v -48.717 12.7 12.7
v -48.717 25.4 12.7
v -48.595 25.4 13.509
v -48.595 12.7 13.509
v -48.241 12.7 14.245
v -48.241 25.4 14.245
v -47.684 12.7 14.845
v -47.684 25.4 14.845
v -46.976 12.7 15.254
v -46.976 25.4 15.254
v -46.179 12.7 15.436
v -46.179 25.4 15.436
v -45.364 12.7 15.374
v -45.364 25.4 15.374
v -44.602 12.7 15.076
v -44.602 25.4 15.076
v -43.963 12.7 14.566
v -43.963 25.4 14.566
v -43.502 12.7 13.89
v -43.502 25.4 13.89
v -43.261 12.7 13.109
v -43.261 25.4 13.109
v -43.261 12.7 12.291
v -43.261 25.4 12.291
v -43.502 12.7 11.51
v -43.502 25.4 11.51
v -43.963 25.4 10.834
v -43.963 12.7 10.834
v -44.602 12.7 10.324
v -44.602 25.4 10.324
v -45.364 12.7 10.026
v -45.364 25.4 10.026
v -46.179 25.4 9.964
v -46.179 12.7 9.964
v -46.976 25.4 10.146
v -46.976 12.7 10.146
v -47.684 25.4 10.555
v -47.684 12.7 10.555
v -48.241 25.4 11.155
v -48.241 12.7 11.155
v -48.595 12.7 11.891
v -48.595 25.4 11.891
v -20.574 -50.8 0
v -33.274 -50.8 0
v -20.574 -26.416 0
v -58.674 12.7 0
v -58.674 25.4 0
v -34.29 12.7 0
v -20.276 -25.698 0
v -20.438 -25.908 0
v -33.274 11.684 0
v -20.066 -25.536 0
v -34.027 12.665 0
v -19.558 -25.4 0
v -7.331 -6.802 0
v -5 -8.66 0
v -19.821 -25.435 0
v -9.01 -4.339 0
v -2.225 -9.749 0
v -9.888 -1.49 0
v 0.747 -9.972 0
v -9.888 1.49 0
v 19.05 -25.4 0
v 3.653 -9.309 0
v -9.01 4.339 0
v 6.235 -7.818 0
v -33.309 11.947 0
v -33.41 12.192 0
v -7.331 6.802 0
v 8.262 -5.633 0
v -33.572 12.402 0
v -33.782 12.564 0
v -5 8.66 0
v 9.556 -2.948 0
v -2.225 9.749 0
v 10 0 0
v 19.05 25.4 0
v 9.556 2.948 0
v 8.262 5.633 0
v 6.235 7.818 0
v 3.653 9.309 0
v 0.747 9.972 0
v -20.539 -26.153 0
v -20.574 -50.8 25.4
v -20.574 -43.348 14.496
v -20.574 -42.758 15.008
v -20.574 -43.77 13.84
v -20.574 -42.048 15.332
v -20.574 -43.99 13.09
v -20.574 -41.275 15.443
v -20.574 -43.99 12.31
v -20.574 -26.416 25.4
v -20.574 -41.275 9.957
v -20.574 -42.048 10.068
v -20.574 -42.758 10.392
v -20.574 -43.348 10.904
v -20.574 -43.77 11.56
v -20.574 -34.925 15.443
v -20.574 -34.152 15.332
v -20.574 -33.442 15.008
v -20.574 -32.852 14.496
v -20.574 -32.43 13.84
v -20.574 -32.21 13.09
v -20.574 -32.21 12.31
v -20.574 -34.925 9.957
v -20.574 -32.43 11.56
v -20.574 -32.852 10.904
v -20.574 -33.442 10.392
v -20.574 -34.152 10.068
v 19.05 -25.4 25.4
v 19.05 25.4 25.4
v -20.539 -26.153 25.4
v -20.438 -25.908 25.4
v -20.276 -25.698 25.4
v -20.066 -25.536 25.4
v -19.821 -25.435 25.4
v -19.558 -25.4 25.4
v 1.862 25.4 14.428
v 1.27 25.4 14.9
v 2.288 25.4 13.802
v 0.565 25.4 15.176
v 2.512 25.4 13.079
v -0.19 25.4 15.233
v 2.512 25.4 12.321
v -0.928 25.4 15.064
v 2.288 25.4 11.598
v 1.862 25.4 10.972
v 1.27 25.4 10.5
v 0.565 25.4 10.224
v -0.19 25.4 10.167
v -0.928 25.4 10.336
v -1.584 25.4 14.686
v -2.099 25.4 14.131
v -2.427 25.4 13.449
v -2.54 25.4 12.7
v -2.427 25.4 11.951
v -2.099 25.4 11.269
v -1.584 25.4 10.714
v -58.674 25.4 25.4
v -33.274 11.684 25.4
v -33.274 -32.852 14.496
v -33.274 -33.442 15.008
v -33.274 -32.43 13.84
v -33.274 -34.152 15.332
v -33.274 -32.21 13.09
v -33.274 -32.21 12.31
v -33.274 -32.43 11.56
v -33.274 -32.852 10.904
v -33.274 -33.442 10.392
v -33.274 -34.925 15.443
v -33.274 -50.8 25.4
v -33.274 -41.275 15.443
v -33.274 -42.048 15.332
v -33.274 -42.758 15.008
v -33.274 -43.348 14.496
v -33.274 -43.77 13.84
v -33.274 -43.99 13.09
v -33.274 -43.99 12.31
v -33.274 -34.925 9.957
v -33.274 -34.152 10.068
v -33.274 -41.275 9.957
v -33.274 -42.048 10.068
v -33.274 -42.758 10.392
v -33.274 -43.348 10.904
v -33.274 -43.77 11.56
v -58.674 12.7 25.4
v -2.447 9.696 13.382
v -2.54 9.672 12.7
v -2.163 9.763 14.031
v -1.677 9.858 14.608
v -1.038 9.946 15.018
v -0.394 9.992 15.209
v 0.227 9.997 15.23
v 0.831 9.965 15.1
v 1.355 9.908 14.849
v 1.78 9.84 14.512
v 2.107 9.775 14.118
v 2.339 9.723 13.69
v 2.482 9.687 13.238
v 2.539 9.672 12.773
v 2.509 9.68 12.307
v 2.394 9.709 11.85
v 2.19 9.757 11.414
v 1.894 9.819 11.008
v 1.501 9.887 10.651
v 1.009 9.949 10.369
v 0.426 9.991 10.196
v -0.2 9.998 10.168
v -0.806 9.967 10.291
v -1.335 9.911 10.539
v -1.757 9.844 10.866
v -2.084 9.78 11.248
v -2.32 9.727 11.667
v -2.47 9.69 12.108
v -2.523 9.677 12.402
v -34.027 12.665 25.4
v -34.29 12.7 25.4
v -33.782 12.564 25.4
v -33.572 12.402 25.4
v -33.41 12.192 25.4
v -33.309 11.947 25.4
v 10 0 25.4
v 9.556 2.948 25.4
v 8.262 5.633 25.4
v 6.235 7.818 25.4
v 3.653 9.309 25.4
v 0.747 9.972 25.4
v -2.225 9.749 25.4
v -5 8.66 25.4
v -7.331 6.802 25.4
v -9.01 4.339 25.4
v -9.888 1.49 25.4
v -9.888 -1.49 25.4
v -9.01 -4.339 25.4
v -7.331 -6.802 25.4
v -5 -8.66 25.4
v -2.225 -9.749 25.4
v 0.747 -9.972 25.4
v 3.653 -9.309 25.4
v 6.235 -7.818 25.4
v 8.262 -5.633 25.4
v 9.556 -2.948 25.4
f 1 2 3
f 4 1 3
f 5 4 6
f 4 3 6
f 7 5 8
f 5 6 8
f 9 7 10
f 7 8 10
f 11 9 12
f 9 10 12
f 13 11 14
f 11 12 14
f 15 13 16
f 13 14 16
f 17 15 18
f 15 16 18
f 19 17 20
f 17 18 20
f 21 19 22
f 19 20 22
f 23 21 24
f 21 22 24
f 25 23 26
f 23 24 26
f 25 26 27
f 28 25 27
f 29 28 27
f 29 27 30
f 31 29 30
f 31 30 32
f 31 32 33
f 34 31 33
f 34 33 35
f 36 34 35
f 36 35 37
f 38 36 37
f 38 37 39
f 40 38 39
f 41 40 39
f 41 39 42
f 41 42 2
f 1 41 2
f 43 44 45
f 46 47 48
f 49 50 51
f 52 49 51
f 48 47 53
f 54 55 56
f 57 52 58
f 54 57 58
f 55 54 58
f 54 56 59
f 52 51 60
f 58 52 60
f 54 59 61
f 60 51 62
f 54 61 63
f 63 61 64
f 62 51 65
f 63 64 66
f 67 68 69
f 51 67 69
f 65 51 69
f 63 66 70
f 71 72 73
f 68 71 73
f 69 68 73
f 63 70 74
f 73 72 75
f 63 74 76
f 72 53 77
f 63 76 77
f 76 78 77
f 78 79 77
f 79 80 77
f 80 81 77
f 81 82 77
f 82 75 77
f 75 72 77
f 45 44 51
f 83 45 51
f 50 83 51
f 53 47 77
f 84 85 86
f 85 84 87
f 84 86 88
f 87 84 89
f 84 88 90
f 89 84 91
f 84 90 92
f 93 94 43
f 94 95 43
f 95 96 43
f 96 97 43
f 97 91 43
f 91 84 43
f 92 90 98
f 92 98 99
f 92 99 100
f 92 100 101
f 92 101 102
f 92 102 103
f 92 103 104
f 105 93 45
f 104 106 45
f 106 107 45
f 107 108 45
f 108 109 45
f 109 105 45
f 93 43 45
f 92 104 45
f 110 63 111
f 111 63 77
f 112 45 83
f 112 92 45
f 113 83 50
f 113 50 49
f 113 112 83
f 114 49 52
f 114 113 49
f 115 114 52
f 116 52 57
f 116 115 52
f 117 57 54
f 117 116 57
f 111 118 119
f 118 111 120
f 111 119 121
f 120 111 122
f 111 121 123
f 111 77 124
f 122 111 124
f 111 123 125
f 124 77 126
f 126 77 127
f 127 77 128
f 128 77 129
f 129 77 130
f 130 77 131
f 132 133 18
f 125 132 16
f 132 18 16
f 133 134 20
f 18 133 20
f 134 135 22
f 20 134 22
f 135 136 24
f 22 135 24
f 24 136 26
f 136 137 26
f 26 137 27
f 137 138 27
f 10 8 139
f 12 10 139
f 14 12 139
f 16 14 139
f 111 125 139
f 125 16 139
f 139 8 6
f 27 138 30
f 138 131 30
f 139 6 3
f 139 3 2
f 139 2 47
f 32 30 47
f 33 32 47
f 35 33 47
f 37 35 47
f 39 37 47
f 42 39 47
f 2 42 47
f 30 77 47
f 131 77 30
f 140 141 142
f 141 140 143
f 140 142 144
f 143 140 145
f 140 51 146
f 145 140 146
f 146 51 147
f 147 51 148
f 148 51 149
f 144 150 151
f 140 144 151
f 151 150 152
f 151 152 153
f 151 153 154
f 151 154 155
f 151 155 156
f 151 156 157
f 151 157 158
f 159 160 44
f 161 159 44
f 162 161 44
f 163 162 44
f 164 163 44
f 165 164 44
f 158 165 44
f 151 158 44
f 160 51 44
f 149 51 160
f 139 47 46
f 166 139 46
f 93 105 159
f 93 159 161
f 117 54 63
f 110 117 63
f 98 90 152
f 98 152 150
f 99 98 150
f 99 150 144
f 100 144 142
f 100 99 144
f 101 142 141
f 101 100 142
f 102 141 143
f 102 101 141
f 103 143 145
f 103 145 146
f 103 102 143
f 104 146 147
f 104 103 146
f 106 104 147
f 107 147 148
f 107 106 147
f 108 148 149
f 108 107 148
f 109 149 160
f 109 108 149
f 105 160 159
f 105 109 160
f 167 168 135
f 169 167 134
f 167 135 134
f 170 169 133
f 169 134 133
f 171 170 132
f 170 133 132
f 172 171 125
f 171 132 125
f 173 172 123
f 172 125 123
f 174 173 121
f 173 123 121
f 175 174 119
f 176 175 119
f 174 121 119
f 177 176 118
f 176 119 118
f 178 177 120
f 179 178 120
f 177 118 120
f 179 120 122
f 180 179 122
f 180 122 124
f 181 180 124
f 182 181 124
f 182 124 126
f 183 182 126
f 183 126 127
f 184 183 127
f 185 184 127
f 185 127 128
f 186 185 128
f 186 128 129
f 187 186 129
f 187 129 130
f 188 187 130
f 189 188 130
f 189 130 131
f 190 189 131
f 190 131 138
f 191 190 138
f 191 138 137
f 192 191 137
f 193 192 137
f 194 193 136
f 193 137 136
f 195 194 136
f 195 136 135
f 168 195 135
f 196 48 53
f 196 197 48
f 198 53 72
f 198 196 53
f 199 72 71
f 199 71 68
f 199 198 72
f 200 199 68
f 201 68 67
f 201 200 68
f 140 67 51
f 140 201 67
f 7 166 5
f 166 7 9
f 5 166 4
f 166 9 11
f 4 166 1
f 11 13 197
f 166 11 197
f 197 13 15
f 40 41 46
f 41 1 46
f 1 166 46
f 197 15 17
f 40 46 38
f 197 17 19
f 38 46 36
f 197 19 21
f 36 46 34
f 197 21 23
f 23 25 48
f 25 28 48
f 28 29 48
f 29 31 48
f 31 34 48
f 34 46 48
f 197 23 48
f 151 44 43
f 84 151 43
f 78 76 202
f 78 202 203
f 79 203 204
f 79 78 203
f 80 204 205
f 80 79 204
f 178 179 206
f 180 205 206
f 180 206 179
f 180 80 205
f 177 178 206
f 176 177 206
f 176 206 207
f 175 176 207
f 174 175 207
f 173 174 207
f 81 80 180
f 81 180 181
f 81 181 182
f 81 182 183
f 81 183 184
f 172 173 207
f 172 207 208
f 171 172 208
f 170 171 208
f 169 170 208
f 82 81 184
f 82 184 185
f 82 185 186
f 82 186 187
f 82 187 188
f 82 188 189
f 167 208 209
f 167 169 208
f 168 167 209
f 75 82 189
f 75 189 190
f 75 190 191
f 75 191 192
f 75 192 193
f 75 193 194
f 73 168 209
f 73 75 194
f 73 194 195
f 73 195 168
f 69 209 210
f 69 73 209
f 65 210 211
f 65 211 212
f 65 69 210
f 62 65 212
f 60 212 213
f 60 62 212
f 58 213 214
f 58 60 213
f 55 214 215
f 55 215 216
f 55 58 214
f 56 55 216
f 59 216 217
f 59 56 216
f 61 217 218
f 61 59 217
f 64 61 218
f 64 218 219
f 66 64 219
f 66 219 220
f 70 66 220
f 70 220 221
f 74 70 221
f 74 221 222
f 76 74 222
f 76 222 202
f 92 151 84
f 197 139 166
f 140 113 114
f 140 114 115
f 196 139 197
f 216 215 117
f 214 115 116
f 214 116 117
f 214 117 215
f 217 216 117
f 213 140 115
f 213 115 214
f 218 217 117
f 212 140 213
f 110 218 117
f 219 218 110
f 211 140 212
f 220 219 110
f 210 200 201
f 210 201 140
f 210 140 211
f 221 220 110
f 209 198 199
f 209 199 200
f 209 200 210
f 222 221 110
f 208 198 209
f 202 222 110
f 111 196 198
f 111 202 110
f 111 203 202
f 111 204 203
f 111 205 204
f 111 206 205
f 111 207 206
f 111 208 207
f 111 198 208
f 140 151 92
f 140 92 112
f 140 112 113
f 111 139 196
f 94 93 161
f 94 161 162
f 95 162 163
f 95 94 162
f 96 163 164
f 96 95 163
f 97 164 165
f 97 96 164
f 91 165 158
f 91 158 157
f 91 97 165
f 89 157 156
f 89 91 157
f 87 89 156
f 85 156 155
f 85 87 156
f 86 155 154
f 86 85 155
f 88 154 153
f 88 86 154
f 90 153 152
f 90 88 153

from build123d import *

# Parameters (mm, degrees)
SKETCH1_R           = 10
BOSS_EXTRUDE1_DEPTH = 25.4
CUT_EXTRUDE1_REACH  = 101.47
SKETCH2_R           = 2.7432
SKETCH2_R_2         = 2.54
CUT_EXTRUDE2_DEPTH  = 12.7
FILLET1_R           = 1.016


with BuildPart() as part:
    # Sketch1 → Boss-Extrude1 (new body)
    with BuildSketch(Plane.XY):
        Polygon((-58.674, 12.7), (-33.274, 12.7), (-33.274, -50.8), (-20.574, -50.8), (-20.574, -25.4), (19.05, -25.4), (19.05, 25.4), (-58.674, 25.4), align=None)
        Circle(SKETCH1_R, mode=Mode.SUBTRACT)
    extrude(amount=BOSS_EXTRUDE1_DEPTH)

    # Sketch2 → Cut-Extrude1 (cut, up to next)
    with BuildSketch(Plane(origin=(0, 25.4, 0), x_dir=(1, 0, 0), z_dir=(0, 1, 0)), mode=Mode.PRIVATE) as cut_extrude1_sk1:
        with Locations(Location((-45.974, -12.7, 0), (0, 0, 180))):
            Circle(SKETCH2_R)
    cut_extrude1_tool1 = extrude(cut_extrude1_sk1.sketch, amount=-CUT_EXTRUDE1_REACH, mode=Mode.PRIVATE) & part.part
    # Sketch2 → Cut-Extrude1 (cut, up to next)
    with BuildSketch(Plane(origin=(0, 25.4, 0), x_dir=(1, 0, 0), z_dir=(0, 1, 0)), mode=Mode.PRIVATE) as cut_extrude1_sk2:
        with Locations(Location((0, -12.7, 0), (0, 0, 180))):
            Circle(SKETCH2_R_2)
    cut_extrude1_tool2 = extrude(cut_extrude1_sk2.sketch, amount=-CUT_EXTRUDE1_REACH, mode=Mode.PRIVATE) & part.part
    add(cut_extrude1_tool1.solids().sort_by_distance((-45.974, 25.4, 12.7))[0], mode=Mode.SUBTRACT)
    add(cut_extrude1_tool2.solids().sort_by_distance((0, 25.4, 12.7))[0], mode=Mode.SUBTRACT)

    # Sketch3 → Cut-Extrude2 (cut)
    with BuildSketch(Plane(origin=(-20.574, 0, 0), x_dir=(0, 0, -1), z_dir=(1, 0, 0))):
        with BuildLine():
            Line((-9.9568, -34.925), (-9.9568, -41.275))
            ThreePointArc((-9.9568, -41.275), (-12.7, -44.0182), (-15.4432, -41.275))
            Line((-15.4432, -41.275), (-15.4432, -34.925))
            ThreePointArc((-15.4432, -34.925), (-12.7, -32.1818), (-9.9568, -34.925))
        make_face()
    extrude(amount=-CUT_EXTRUDE2_DEPTH, mode=Mode.SUBTRACT)

    # Fillet1
    fillet1_edges = [part.edges().sort_by_distance(p)[0] for p in [
        (-20.574, -25.4, 12.7),
        (-33.274, 12.7, 12.7),
    ]]
    fillet(fillet1_edges, radius=FILLET1_R)


solid = part.part
